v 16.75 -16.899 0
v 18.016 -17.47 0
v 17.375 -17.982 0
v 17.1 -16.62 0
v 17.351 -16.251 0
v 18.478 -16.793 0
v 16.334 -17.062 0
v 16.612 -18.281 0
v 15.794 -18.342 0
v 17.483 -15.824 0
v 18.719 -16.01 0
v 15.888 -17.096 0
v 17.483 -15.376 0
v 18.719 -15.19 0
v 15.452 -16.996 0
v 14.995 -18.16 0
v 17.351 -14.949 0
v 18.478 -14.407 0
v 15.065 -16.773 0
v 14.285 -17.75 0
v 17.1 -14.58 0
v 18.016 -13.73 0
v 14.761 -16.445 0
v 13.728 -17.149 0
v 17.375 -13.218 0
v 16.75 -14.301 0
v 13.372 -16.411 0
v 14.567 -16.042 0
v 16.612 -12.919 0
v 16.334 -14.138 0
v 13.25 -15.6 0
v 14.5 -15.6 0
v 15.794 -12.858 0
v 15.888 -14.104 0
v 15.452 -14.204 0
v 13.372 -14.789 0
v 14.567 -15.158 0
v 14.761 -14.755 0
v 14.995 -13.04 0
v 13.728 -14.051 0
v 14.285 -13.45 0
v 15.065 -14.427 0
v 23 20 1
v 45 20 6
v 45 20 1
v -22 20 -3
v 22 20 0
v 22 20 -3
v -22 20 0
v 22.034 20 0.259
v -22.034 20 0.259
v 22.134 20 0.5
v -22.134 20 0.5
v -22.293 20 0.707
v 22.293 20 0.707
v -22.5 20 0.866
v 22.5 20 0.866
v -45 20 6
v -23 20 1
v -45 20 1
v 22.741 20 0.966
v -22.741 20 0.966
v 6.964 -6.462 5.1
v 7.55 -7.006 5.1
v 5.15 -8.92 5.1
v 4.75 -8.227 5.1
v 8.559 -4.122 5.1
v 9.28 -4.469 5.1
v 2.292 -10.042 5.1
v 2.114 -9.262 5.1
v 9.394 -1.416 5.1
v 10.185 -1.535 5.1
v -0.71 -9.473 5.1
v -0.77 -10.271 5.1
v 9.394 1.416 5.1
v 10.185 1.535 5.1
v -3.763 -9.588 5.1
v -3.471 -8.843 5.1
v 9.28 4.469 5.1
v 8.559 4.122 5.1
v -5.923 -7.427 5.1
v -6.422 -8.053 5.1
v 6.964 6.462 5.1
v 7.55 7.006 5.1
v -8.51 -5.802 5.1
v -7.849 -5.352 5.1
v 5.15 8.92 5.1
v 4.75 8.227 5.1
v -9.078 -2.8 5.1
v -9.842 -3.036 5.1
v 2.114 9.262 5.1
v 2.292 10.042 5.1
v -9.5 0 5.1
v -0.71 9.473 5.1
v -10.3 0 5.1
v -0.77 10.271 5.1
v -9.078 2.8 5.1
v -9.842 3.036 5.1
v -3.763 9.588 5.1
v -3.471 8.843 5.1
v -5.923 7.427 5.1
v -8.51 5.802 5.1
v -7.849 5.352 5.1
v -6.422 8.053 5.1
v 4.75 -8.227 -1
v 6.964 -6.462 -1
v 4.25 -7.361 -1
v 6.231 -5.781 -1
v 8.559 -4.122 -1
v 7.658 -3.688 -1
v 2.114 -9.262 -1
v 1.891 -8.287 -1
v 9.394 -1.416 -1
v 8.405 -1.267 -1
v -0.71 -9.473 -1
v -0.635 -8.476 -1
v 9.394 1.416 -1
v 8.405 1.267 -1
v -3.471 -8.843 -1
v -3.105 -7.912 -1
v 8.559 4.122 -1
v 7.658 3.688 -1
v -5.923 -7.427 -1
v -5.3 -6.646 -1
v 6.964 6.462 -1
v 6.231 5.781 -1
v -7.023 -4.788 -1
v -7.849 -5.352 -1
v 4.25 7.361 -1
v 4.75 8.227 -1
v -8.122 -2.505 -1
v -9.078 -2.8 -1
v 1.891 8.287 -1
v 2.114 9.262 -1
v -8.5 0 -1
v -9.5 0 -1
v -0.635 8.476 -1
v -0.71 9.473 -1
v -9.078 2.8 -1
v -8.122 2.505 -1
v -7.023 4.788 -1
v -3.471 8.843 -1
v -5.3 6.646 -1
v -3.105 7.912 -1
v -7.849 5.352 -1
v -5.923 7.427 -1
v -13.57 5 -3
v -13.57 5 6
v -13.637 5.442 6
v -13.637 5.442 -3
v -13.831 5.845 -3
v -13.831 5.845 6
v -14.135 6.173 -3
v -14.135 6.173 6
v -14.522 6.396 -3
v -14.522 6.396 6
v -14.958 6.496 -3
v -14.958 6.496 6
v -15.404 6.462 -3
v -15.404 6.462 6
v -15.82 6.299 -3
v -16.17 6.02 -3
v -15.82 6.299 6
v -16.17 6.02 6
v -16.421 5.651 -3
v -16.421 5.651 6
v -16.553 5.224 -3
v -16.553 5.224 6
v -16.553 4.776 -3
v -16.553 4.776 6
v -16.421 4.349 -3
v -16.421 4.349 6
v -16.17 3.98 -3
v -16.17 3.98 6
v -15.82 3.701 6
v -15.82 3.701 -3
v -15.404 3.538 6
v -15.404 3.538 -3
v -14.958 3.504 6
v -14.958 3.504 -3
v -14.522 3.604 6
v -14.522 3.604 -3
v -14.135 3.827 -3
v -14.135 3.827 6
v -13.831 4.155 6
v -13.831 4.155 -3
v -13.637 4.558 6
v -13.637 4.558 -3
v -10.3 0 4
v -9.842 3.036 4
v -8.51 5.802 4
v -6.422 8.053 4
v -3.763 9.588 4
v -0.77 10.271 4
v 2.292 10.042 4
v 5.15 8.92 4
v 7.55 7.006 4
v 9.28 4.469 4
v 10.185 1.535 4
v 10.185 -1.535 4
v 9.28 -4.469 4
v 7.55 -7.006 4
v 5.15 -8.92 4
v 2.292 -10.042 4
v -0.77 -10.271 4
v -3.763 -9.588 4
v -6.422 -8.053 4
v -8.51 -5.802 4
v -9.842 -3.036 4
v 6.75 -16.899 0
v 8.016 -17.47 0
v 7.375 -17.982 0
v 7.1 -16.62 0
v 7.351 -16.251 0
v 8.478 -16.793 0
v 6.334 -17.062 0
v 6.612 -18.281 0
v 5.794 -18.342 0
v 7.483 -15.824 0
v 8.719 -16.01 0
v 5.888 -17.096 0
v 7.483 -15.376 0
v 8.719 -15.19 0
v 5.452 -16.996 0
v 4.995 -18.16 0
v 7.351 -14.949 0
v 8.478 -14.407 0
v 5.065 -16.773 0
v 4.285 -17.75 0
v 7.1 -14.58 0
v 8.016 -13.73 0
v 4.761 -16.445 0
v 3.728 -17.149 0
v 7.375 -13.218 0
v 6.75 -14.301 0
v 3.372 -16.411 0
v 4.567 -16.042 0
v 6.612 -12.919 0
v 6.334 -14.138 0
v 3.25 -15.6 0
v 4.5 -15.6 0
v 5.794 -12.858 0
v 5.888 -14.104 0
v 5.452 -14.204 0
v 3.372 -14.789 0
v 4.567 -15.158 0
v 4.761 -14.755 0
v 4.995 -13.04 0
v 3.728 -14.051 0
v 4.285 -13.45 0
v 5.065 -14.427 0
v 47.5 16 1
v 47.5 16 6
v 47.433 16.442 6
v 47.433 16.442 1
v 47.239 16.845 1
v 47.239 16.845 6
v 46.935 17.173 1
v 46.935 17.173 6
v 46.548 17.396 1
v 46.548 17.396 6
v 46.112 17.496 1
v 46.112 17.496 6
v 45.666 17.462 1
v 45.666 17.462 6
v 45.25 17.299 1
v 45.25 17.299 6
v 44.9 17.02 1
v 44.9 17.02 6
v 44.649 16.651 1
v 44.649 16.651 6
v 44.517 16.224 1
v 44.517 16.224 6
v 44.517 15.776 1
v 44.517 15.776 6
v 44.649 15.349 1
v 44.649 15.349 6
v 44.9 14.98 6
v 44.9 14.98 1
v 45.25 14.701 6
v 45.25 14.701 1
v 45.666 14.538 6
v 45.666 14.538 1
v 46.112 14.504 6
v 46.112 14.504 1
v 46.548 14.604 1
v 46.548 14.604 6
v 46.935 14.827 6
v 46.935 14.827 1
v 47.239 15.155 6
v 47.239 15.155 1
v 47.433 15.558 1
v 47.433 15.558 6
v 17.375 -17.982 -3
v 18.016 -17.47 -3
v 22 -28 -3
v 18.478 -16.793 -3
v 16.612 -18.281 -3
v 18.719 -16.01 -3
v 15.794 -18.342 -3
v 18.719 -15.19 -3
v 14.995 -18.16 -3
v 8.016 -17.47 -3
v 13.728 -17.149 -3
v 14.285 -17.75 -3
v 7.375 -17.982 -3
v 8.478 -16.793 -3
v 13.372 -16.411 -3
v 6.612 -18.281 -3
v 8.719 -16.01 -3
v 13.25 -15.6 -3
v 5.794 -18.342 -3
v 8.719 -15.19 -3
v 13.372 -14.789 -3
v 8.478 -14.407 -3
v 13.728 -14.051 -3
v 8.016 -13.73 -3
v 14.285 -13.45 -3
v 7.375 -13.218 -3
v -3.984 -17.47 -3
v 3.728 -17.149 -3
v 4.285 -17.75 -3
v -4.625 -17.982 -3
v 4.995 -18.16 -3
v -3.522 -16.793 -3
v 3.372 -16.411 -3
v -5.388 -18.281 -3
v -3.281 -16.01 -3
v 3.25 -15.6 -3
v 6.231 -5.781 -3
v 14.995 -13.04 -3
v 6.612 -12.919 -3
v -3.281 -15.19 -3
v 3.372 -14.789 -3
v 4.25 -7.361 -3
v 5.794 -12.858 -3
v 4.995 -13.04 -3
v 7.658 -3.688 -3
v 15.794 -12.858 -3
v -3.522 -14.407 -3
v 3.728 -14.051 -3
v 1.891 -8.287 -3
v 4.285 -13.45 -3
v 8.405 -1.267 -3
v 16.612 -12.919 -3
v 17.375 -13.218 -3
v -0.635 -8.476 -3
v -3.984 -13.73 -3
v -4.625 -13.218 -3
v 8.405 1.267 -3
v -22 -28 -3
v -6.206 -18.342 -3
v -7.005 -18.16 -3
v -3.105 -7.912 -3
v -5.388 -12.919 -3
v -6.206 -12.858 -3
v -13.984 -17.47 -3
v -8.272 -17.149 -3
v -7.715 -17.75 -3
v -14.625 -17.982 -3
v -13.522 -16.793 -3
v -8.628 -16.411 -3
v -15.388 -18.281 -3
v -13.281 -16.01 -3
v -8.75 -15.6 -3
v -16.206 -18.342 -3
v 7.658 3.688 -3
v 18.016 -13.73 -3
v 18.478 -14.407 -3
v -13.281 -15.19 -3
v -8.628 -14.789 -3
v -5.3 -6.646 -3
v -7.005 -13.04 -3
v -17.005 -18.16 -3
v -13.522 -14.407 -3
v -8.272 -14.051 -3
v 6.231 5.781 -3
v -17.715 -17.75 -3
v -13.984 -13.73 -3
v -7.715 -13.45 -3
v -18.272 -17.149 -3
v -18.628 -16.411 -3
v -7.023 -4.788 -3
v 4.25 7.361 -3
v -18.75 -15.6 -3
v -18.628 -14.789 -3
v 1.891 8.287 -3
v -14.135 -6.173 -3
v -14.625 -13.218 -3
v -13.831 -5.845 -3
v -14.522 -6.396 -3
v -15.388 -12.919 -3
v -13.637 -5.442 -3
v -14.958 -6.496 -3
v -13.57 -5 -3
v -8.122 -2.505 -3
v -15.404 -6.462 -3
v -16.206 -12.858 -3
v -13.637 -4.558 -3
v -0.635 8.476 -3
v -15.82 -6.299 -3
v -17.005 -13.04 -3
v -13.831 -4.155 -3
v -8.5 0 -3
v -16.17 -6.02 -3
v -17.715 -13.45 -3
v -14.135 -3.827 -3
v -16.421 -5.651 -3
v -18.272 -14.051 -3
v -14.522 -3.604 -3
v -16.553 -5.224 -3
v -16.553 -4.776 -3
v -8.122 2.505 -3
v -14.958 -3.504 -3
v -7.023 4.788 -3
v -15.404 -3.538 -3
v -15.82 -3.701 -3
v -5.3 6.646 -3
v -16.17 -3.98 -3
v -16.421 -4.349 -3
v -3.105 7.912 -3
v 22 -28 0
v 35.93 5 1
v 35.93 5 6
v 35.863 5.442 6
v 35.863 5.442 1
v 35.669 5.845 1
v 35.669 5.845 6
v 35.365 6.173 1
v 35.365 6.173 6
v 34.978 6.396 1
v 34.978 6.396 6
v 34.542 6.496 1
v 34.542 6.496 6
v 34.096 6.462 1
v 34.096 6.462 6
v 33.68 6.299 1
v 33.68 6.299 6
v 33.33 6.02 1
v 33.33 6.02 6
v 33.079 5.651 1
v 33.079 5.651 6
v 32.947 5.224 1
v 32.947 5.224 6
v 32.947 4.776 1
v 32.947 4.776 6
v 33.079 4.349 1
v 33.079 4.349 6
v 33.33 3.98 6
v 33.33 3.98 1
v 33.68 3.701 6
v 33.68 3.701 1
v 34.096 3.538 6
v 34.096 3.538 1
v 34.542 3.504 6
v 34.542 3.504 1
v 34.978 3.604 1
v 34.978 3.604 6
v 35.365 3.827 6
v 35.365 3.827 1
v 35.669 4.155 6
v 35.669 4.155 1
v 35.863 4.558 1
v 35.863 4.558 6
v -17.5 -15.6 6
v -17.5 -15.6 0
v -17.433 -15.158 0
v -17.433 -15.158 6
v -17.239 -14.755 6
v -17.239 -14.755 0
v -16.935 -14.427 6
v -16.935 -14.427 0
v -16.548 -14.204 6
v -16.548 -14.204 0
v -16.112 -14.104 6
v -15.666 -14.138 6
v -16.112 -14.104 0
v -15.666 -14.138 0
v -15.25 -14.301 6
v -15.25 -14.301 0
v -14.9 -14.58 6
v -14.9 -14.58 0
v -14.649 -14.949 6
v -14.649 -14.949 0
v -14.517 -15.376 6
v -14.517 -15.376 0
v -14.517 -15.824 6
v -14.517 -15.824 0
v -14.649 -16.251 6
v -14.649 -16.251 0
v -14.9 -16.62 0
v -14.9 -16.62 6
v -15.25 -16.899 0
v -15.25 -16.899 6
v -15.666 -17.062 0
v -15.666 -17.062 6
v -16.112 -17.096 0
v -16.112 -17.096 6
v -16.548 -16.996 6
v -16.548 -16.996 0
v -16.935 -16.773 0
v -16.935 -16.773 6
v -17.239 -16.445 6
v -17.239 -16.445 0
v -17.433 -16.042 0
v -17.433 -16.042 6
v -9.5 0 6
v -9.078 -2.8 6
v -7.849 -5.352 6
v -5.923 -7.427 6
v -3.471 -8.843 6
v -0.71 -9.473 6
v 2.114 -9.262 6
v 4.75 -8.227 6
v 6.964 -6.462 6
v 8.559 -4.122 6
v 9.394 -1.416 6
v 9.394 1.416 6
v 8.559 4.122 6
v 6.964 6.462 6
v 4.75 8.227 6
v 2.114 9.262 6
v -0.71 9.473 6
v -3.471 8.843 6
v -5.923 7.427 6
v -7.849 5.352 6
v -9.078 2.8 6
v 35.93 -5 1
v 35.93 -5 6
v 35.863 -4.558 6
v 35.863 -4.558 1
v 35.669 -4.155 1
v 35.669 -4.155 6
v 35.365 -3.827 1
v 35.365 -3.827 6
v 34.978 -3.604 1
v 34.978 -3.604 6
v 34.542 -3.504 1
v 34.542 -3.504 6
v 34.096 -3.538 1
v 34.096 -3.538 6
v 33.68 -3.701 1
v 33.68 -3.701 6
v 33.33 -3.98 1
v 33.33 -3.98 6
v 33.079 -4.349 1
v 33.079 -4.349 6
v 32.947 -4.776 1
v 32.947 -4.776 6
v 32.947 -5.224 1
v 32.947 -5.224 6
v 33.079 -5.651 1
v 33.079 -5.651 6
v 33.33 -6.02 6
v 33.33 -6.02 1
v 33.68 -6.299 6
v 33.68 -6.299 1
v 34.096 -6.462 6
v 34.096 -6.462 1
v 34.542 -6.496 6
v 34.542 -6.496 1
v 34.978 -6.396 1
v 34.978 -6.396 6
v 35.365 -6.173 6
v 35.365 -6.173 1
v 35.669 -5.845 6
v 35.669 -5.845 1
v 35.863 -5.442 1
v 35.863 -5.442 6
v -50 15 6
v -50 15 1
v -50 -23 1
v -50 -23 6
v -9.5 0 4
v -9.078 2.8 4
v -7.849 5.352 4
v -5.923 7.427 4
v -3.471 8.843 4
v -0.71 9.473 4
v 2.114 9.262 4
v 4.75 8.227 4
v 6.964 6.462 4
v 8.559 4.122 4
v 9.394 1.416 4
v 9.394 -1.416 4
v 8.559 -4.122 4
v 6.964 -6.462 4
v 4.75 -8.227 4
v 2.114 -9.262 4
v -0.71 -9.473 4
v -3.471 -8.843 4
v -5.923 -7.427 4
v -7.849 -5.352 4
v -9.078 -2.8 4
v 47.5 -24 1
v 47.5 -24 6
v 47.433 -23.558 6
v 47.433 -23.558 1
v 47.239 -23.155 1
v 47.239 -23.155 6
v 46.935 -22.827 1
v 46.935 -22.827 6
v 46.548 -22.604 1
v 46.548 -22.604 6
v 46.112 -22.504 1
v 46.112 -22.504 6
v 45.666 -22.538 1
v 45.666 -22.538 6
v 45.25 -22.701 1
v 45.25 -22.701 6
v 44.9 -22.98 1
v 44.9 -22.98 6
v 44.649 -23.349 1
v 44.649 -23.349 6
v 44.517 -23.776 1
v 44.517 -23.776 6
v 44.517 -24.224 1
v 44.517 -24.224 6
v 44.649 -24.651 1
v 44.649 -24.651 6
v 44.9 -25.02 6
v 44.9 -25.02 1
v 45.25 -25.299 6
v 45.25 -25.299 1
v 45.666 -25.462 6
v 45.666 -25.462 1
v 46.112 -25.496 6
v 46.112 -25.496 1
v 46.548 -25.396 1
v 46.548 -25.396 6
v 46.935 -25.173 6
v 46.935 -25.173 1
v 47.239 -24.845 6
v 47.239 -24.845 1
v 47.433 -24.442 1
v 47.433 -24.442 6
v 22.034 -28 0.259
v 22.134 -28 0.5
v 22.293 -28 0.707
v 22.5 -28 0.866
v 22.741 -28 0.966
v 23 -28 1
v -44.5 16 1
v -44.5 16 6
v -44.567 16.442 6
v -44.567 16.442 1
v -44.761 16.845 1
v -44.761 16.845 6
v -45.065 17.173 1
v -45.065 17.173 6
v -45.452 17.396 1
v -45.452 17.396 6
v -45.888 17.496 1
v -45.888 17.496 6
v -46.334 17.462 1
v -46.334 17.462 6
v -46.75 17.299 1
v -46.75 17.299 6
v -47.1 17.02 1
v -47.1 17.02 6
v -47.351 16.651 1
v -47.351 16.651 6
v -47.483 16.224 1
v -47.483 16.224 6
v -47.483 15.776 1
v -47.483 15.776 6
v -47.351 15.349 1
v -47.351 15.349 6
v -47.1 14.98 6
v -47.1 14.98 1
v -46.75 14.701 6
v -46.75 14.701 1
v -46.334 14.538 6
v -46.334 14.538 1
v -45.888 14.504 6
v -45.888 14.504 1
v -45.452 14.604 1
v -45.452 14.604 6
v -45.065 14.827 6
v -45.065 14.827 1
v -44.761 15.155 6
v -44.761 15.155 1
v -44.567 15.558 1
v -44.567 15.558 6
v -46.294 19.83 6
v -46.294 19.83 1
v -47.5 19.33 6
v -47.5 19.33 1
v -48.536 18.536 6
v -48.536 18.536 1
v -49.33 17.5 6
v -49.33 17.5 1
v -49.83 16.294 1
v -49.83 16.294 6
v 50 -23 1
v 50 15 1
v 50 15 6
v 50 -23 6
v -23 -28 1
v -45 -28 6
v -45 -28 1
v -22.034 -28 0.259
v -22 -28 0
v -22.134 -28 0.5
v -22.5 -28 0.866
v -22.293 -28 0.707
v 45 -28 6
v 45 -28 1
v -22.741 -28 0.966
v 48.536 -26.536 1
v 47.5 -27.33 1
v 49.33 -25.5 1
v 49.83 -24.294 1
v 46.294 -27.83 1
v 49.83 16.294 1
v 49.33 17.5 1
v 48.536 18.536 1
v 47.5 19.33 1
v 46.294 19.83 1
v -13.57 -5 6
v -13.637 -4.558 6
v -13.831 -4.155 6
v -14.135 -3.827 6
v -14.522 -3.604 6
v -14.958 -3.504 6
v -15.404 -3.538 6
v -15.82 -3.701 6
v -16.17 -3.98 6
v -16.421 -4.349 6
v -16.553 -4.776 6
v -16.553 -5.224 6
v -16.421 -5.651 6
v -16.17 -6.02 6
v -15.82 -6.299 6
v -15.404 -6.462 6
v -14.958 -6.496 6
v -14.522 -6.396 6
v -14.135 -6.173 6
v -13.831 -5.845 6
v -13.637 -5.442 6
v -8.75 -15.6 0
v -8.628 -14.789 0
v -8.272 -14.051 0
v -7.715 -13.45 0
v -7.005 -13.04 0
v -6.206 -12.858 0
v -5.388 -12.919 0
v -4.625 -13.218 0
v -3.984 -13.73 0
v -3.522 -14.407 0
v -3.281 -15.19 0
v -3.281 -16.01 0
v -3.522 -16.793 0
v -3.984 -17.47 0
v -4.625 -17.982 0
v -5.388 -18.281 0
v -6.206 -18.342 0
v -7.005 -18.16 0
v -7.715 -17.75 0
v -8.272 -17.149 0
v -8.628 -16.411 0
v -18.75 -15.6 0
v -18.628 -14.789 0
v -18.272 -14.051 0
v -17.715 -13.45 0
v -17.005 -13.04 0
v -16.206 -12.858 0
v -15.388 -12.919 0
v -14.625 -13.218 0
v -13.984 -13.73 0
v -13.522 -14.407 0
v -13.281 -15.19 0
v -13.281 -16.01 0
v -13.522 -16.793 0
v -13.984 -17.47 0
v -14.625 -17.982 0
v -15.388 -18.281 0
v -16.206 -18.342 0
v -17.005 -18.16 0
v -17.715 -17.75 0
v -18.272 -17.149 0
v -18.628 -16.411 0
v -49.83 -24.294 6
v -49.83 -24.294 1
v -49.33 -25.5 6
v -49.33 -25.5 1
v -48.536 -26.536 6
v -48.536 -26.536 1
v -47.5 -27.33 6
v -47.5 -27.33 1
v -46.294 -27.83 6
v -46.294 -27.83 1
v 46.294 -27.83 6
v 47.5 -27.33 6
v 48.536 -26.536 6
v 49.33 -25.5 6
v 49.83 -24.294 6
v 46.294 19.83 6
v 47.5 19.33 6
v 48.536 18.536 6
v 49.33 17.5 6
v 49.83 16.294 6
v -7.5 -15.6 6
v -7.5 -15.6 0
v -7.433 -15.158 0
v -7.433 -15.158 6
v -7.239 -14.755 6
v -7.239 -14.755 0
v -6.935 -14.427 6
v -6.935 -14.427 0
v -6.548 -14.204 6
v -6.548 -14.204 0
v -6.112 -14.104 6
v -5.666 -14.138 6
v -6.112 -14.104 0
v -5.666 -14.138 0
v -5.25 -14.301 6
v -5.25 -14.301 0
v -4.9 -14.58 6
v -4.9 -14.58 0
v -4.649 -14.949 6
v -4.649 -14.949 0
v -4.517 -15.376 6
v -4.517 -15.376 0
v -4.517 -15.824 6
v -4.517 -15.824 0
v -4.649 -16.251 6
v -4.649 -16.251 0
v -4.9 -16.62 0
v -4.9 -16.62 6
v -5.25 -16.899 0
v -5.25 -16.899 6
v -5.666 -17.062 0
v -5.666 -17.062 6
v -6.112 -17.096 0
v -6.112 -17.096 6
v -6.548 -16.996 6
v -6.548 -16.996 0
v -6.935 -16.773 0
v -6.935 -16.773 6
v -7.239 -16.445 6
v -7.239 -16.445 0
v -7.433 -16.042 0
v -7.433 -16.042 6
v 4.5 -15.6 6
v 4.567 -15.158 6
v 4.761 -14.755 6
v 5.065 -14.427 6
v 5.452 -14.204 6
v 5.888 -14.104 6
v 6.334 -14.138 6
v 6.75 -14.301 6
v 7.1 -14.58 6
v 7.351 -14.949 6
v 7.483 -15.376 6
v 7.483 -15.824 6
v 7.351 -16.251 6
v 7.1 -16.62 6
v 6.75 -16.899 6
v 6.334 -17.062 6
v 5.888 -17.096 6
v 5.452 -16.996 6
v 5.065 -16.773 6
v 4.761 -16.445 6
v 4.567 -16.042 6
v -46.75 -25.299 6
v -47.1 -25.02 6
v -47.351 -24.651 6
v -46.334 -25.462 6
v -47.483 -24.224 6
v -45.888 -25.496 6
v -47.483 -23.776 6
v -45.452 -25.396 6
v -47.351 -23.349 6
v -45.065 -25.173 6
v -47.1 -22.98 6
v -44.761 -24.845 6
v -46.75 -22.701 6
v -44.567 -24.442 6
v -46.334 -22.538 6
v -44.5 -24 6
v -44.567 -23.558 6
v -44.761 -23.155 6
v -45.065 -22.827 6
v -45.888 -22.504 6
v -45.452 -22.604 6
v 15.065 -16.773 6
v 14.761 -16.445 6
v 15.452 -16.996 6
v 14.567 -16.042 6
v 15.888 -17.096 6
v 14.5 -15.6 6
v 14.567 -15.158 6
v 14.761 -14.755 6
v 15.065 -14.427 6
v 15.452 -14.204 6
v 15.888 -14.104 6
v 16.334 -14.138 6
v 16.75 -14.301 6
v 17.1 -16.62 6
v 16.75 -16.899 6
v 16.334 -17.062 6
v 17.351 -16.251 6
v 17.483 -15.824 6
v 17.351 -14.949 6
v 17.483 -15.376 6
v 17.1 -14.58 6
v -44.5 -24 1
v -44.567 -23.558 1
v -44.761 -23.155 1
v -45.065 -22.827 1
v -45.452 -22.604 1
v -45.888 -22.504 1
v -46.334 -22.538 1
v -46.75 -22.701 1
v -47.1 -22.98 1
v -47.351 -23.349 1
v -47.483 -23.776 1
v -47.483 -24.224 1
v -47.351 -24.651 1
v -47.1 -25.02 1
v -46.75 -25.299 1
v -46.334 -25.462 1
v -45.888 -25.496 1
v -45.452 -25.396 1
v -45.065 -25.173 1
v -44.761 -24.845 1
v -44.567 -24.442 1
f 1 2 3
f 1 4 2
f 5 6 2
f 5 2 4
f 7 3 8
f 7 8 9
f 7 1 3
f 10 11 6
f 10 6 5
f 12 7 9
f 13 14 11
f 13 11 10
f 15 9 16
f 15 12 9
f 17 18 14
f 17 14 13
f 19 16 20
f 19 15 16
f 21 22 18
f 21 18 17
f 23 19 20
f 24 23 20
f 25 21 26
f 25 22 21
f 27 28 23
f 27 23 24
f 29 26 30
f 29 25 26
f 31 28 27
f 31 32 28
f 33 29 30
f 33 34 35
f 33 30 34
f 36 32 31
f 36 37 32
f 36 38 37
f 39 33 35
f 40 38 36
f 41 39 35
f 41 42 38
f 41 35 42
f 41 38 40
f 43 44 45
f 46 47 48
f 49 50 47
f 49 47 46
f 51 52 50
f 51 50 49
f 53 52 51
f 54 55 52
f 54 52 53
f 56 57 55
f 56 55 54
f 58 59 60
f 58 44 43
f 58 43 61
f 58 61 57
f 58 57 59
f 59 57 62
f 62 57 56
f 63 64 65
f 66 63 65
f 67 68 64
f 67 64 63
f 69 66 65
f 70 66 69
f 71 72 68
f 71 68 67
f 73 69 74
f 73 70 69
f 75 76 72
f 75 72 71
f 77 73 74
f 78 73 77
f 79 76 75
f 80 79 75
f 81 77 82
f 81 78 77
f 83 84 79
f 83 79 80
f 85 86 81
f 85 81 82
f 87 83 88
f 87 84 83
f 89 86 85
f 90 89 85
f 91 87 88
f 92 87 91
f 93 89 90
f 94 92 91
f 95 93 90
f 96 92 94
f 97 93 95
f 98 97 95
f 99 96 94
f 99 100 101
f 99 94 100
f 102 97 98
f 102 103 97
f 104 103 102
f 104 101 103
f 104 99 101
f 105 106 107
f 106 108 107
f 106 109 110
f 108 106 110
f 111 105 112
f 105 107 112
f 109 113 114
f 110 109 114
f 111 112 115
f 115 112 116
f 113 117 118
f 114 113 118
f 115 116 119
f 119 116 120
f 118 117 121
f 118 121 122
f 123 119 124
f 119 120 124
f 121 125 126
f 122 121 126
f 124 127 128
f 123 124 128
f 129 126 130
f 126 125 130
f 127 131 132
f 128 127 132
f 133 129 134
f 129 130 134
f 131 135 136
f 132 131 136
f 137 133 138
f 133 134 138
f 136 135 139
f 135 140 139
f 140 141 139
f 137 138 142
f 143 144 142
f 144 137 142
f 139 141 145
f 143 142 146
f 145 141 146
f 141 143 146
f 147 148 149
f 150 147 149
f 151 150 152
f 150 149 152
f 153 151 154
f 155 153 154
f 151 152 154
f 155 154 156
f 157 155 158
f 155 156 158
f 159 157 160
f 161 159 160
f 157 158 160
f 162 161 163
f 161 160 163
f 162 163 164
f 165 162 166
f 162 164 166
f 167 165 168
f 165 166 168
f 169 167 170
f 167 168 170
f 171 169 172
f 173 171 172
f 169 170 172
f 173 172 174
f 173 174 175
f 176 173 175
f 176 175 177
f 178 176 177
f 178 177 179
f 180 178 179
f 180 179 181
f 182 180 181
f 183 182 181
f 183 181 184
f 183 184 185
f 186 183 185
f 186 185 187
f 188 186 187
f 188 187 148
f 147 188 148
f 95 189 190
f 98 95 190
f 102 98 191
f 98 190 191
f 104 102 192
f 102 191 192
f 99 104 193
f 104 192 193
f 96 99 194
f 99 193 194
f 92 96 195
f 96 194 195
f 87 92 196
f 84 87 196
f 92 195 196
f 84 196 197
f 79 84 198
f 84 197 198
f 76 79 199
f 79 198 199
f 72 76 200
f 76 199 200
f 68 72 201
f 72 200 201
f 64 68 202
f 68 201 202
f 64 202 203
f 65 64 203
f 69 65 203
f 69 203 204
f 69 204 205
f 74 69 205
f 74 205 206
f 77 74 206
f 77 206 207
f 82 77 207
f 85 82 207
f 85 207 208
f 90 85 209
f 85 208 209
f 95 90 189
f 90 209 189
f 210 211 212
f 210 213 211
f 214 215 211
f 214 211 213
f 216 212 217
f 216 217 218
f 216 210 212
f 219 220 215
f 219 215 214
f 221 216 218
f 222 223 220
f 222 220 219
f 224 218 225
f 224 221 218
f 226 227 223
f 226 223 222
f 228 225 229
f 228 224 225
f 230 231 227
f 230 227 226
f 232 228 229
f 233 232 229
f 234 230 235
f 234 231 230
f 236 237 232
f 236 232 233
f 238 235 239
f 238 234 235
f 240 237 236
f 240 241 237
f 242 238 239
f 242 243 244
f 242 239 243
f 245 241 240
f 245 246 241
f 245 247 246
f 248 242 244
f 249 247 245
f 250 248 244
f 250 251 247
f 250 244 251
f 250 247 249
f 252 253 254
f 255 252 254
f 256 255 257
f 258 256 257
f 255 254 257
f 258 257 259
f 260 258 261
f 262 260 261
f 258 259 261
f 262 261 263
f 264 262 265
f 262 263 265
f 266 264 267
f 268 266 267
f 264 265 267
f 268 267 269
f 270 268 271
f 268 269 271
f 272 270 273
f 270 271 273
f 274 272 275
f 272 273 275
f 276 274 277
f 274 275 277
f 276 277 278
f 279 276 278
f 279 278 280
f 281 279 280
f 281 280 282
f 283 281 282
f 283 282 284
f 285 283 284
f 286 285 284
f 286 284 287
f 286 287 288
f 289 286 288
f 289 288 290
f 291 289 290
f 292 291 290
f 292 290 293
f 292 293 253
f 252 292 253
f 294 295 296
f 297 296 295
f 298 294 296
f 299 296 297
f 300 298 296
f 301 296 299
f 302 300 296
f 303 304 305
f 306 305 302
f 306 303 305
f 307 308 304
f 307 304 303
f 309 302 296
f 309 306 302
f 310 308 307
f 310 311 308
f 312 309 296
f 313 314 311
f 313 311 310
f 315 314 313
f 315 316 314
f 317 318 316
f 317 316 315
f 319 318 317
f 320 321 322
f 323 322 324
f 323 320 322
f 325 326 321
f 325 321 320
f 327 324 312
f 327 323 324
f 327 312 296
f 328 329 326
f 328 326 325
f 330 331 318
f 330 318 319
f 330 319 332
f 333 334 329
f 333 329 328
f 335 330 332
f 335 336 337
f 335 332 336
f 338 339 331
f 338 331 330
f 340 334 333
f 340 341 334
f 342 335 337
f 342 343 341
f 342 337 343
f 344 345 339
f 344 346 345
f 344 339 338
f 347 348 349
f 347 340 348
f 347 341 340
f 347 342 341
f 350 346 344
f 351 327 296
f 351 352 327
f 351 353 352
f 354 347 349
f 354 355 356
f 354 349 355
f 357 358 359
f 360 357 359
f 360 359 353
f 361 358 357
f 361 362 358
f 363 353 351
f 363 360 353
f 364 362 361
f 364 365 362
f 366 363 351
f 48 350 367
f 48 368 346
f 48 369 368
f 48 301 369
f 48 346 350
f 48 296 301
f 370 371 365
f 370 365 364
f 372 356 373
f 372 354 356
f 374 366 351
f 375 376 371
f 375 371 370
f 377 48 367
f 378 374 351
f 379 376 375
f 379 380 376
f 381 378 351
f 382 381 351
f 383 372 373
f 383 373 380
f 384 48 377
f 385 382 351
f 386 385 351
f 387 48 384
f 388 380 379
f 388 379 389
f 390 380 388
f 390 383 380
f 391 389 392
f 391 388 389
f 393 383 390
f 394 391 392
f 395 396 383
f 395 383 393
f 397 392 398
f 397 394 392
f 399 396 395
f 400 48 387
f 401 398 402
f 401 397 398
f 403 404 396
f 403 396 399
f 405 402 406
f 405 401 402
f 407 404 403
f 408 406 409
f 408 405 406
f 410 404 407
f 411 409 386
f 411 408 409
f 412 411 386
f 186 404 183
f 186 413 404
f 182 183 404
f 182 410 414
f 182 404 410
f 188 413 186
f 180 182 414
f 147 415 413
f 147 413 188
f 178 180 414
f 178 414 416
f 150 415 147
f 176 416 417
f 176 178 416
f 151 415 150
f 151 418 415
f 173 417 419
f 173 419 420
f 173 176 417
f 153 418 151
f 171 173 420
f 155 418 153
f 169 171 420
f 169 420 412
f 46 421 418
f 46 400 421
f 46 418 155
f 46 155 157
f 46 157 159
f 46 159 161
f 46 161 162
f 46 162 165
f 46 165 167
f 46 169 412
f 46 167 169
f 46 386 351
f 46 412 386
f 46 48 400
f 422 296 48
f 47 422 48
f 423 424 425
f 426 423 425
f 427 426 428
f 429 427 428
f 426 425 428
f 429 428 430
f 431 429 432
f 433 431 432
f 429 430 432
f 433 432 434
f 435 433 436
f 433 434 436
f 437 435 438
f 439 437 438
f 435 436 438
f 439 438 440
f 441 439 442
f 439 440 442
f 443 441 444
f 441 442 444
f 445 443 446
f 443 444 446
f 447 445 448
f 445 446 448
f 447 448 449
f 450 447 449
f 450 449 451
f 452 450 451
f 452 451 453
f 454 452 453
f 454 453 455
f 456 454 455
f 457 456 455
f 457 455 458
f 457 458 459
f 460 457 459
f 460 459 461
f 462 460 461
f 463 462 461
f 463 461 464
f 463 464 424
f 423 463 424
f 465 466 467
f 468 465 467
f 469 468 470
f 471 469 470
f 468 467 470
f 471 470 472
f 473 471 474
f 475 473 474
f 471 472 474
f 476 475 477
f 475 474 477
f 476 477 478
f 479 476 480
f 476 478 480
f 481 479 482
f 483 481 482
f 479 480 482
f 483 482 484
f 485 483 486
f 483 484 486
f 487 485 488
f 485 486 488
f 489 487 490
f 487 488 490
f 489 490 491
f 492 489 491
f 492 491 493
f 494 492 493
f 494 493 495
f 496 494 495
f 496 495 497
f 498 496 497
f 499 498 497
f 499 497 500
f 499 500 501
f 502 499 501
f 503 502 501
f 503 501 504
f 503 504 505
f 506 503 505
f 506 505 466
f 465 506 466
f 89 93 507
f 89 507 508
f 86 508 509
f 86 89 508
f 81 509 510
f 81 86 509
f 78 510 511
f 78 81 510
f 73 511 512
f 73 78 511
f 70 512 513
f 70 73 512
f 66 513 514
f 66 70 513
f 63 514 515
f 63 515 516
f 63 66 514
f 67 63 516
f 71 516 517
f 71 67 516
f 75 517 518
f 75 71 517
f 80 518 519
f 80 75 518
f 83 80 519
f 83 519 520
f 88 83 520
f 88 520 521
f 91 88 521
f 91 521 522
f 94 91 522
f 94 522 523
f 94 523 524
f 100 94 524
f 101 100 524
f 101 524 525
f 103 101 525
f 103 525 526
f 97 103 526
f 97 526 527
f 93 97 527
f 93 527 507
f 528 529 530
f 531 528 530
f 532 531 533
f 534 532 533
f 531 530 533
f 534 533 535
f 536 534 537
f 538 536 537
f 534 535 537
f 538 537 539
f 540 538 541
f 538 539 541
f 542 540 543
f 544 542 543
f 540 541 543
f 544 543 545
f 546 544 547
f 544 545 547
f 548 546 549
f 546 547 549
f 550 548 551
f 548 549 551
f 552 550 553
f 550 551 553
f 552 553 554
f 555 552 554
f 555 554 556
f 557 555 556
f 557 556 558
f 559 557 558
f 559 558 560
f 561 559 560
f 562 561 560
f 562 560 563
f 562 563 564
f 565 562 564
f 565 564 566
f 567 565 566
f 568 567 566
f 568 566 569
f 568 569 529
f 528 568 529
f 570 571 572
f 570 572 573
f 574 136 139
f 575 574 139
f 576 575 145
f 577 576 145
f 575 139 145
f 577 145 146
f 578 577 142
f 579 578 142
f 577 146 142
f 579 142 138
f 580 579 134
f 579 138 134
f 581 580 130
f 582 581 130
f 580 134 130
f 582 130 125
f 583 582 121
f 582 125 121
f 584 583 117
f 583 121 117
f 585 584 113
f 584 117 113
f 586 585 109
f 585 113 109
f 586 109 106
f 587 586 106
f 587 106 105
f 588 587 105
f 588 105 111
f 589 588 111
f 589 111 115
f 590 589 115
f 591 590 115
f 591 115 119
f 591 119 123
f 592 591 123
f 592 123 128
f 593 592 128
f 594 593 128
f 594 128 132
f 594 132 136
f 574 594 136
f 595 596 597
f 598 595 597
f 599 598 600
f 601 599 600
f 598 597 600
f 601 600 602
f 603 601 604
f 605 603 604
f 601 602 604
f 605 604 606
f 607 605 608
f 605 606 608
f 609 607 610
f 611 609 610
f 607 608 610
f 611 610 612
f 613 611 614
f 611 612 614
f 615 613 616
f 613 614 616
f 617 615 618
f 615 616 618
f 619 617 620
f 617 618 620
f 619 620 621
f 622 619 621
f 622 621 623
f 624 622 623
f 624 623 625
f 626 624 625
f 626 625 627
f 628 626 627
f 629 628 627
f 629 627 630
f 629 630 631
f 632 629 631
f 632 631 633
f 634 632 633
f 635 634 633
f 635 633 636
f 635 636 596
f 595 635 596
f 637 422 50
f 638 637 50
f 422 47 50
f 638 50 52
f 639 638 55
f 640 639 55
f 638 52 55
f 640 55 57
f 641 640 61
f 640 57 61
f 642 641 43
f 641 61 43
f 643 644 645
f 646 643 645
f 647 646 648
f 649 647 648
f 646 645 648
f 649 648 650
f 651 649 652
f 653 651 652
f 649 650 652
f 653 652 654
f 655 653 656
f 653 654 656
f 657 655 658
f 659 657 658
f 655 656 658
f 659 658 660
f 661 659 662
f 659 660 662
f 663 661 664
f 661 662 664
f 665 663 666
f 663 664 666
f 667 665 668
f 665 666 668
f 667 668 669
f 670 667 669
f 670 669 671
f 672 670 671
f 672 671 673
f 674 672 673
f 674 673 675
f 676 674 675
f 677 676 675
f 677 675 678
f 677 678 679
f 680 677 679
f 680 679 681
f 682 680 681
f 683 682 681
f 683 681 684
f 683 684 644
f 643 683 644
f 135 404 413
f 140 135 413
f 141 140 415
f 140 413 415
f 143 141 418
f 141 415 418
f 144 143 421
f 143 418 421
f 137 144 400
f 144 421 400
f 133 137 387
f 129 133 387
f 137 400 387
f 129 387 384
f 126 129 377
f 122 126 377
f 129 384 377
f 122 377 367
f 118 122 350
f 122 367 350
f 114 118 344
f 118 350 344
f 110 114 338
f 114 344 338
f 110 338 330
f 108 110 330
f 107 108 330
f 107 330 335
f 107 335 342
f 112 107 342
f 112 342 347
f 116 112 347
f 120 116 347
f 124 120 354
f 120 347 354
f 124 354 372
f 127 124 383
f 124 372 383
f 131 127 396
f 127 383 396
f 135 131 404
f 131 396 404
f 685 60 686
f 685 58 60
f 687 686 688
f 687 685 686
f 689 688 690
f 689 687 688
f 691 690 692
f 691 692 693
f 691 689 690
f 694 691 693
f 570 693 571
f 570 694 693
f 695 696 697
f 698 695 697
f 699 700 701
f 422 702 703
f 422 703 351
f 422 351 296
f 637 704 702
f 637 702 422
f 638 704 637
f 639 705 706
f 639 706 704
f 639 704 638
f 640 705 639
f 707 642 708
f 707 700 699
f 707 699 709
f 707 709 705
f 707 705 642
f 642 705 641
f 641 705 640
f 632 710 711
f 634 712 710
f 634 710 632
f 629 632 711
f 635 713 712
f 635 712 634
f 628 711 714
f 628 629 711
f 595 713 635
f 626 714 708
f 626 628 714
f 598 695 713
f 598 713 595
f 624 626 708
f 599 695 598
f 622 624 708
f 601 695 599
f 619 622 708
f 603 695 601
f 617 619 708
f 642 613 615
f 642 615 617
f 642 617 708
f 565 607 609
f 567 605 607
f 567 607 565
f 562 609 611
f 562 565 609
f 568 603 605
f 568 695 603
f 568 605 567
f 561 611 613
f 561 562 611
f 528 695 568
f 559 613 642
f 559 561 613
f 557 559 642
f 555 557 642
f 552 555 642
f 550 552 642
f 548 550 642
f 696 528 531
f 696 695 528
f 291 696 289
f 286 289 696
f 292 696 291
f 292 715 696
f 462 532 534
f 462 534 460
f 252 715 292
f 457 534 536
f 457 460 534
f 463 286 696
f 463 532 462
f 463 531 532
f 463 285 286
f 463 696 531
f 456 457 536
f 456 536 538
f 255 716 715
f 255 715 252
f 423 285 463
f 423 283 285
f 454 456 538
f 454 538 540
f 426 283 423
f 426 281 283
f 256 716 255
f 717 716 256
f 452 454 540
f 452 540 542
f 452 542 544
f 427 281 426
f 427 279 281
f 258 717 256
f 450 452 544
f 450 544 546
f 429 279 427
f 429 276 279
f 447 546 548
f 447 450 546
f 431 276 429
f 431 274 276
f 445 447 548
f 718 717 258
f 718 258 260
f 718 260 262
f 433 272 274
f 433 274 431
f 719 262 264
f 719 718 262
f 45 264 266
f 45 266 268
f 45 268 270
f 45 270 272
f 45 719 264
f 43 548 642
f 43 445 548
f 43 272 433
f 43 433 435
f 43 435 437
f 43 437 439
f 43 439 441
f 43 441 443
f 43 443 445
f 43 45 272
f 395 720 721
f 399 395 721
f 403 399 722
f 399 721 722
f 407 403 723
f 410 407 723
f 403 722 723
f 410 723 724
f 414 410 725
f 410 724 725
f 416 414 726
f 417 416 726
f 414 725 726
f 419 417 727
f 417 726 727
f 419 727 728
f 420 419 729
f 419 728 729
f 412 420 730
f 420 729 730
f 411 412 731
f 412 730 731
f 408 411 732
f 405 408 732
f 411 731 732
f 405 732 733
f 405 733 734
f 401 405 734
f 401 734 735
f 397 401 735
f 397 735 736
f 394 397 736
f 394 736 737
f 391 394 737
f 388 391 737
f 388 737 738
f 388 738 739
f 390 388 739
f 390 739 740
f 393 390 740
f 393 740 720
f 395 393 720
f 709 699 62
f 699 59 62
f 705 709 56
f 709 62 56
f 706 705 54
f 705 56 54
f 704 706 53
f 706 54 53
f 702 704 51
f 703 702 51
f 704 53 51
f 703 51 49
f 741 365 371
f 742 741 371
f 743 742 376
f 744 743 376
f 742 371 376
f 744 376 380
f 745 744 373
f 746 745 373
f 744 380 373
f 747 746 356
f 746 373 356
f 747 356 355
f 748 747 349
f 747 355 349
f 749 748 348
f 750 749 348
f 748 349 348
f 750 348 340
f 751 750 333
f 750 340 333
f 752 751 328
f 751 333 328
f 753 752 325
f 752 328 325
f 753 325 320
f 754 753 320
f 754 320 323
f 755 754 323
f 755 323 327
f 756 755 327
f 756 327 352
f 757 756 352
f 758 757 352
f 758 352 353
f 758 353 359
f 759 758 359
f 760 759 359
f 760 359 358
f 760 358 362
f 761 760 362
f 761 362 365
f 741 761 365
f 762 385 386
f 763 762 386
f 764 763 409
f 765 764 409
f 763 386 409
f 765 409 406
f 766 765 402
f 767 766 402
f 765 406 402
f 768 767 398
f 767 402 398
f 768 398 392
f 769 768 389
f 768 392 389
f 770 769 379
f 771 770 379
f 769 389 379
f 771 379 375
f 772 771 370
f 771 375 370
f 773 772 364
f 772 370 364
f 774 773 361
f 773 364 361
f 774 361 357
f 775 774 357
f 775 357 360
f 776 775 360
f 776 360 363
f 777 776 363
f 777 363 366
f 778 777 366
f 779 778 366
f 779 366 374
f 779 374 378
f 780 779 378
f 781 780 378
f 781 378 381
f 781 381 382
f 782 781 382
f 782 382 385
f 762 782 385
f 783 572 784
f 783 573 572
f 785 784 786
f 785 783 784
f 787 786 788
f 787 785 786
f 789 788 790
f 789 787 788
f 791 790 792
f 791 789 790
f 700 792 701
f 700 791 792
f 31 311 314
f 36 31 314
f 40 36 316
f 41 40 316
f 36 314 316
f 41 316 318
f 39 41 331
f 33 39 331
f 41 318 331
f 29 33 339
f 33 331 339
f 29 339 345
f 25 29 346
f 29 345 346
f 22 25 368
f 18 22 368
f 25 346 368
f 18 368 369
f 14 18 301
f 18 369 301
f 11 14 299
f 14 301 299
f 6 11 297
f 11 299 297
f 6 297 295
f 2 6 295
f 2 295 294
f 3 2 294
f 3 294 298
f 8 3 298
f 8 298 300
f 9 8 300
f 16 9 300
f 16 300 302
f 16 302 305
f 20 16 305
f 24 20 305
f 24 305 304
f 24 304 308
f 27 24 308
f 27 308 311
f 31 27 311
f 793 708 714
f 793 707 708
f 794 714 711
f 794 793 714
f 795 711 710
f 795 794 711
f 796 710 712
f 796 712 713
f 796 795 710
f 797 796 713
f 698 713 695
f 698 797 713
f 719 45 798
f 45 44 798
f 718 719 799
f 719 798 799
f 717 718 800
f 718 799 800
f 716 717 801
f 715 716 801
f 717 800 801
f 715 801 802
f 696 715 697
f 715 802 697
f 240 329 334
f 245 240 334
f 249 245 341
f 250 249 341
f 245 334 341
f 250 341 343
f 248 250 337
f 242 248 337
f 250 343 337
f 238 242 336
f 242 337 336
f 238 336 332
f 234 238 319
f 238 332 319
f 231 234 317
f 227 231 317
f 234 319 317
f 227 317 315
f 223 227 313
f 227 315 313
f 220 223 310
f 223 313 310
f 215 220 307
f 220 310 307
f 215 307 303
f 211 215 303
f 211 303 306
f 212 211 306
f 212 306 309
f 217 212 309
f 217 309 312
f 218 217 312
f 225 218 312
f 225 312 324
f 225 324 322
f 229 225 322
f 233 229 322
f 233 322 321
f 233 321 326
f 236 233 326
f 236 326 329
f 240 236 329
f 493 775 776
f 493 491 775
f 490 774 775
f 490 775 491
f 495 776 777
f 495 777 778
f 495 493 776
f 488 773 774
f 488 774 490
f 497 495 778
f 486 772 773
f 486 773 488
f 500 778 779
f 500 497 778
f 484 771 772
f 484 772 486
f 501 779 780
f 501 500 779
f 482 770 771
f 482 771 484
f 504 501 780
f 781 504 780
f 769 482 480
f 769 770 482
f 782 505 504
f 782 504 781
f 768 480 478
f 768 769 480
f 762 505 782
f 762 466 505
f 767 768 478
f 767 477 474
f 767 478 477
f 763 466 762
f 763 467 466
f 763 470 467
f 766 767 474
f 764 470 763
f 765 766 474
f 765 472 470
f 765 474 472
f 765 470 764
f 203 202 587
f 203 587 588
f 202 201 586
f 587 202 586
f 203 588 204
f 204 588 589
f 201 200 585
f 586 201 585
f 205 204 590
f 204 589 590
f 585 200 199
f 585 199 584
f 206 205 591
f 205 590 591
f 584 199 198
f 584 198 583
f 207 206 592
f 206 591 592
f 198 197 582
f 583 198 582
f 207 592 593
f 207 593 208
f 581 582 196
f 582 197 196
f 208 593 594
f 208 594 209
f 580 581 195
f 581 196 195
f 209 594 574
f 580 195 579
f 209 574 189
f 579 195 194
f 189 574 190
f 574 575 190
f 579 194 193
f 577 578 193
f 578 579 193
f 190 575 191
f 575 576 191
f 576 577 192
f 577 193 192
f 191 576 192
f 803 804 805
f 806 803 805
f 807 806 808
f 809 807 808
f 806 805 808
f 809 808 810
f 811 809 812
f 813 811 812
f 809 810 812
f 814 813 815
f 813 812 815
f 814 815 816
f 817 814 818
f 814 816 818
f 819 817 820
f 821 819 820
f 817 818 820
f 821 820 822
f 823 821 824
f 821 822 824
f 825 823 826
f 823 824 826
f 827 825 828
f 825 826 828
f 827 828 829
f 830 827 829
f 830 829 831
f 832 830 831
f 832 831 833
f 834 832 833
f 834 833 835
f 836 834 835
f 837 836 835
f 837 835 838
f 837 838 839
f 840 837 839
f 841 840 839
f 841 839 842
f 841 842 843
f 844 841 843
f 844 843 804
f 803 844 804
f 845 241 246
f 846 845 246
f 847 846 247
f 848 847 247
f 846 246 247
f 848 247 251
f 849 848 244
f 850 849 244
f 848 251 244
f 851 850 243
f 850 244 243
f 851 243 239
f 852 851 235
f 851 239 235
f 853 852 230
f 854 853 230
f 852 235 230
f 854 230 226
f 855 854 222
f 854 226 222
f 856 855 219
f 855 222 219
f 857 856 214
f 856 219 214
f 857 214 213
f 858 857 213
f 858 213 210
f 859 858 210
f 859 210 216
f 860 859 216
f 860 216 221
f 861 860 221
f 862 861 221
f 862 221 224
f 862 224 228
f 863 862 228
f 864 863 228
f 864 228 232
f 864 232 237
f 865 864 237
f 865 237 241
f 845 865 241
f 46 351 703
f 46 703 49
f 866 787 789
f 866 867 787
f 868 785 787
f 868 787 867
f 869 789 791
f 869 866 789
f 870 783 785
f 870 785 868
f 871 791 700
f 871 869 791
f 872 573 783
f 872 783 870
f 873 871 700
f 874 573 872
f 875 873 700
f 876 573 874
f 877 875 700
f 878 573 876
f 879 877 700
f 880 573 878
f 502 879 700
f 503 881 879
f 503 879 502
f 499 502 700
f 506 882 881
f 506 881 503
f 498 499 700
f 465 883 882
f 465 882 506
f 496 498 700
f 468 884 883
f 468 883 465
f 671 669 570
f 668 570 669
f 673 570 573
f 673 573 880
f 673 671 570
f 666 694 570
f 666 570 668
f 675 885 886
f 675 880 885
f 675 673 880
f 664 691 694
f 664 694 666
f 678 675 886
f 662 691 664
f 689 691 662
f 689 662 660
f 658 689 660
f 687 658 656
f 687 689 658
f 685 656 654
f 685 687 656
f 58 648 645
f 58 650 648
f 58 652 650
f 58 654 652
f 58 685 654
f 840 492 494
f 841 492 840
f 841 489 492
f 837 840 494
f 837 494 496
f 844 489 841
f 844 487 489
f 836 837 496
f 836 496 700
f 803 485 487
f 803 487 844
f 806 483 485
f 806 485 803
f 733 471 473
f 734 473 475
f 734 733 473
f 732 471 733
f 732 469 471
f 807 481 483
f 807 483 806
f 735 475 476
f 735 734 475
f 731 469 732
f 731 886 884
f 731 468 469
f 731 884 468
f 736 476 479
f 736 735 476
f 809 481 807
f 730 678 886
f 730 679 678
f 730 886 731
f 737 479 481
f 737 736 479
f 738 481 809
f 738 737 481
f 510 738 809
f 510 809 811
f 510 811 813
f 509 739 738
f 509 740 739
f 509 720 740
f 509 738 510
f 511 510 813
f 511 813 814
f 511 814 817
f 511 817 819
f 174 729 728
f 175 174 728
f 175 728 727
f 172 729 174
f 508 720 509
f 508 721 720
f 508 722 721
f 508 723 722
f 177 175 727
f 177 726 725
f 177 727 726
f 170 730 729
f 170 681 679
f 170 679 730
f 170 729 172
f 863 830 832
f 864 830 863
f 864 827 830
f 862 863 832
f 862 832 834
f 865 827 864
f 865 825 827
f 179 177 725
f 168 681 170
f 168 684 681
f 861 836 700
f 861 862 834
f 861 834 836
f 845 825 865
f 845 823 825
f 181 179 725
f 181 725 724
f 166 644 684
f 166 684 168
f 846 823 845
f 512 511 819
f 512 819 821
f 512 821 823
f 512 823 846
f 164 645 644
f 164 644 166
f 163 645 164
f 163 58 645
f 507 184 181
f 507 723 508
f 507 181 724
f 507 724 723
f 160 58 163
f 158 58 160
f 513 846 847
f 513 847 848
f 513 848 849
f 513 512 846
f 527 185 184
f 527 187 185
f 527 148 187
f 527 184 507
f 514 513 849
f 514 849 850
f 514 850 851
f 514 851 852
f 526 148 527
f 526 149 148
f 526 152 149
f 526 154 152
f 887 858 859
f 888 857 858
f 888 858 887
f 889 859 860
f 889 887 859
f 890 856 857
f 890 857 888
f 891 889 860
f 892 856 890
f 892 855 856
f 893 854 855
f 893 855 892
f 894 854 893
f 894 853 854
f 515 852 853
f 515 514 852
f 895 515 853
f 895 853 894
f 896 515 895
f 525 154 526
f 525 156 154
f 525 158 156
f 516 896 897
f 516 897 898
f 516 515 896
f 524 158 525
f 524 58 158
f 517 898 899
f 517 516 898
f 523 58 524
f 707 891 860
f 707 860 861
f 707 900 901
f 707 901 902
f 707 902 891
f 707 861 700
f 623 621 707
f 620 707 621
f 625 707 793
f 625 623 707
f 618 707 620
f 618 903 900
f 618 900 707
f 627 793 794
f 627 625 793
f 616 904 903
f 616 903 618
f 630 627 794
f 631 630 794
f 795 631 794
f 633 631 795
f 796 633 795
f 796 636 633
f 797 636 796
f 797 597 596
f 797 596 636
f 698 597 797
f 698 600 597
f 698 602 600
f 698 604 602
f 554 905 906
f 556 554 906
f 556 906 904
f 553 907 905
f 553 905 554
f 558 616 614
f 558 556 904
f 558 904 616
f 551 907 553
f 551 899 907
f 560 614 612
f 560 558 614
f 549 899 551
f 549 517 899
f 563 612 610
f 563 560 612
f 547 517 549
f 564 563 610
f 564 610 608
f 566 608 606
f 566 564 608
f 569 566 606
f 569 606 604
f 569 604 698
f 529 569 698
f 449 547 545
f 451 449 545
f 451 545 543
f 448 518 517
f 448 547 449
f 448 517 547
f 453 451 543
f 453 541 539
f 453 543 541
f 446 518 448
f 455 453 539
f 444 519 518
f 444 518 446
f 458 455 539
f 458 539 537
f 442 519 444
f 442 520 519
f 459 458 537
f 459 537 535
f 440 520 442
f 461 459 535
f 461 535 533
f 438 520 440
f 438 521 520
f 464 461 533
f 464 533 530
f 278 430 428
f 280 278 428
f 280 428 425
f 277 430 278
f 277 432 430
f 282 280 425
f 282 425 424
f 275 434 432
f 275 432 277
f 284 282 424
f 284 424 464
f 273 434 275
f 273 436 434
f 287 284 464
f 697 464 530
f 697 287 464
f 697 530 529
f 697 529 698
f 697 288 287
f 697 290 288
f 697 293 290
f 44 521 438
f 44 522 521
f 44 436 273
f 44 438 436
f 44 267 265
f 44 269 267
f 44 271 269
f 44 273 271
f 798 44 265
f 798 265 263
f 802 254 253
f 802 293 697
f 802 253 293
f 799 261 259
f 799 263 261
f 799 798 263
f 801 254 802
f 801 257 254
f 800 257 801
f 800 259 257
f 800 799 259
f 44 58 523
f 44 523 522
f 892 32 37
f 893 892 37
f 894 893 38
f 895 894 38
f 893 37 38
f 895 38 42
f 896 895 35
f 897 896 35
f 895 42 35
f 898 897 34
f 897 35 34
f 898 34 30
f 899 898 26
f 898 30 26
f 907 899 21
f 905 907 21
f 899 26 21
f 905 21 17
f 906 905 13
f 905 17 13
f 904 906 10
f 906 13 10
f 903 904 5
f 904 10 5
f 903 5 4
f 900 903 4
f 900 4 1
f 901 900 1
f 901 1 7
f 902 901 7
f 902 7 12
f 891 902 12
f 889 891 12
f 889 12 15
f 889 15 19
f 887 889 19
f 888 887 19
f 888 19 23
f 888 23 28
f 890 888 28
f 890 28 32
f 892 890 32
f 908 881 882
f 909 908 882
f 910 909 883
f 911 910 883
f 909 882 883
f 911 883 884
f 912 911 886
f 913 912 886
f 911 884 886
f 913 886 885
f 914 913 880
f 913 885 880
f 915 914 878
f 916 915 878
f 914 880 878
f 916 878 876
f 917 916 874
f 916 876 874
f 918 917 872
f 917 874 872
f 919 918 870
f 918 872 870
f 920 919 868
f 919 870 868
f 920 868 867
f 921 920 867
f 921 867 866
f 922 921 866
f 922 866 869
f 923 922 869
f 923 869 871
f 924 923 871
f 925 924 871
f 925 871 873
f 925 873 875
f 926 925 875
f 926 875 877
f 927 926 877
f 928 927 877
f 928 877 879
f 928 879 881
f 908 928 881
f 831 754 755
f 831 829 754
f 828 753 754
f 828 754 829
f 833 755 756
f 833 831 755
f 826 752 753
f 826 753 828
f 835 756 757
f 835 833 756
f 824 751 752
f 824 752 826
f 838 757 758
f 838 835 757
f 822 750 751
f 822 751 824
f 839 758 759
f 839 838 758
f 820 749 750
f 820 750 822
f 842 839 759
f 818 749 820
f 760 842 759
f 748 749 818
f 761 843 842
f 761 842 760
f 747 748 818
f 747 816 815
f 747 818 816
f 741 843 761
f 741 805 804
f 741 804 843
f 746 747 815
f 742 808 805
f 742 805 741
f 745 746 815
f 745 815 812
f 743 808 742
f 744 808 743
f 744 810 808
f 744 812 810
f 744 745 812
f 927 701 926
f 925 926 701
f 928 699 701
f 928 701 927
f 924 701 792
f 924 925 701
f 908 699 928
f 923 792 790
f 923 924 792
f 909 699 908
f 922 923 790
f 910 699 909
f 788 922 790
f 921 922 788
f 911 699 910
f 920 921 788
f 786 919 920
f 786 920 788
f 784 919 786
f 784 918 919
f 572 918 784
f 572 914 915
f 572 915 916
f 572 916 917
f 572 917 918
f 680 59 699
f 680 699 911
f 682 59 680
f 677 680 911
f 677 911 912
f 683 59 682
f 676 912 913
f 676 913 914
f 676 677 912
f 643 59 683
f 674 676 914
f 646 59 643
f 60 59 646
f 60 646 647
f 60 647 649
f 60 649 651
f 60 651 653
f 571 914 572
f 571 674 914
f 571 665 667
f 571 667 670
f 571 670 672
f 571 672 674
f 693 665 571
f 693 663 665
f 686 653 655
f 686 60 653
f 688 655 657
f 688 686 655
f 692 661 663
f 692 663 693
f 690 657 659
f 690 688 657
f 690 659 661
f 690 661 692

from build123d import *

# Parameters (mm, degrees)
SKETCH_1_W                = 100
SKETCH_1_H                = 40
EXTRUDE_1_DEPTH           = 6
SKETCH_2_W                = 100
SKETCH_2_H                = 40
EXTRUDE_2_DEPTH           = 3
SKETCH_4_R                = 9.5
CUT_EXTRUDE_1_DEPTH       = 7
SKETCH_5_R                = 10.3
CUT_EXTRUDE_2_DEPTH       = 1.1
CUT_EXTRUDE_START         = -5
SKETCH_6_R                = 9.5
CUT_EXTRUDE_3_DEPTH       = 5
SKETCH_7_R                = 1.5
CUT_EXTRUDE_4_DEPTH       = 12
SKETCH_8_W                = 100
SKETCH_8_H                = 9
EXTRUDE_3_DEPTH           = 8
SKETCH_9_R                = 1.5
CUT_EXTRUDE_5_DEPTH       = 10
SKETCH_13_R               = 1.5
CUT_EXTRUDE_6_DEPTH       = 10
HOLE_WIZARD_1_D           = 3
HOLE_WIZARD_1_CBORE_D     = 5.5
HOLE_WIZARD_1_CBORE_DEPTH = 3
SKETCH_15_W               = 28
SKETCH_15_H               = 56.444719302
SKETCH_15_H_2             = 58.874458875
CUT_EXTRUDE_7_DEPTH       = 4
FILLET_3_R                = 1
FILLET_4_R                = 5
SKETCH_16_R               = 9.5
SKETCH_16_R_2             = 8.5
EXTRUDE_4_DEPTH           = 2


with BuildPart() as part:
    # 草图1 → 凸台-拉伸1 (new body)
    with BuildSketch(Plane.XY):
        Rectangle(SKETCH_1_W, SKETCH_1_H)
    extrude(amount=EXTRUDE_1_DEPTH)

    # 草图2 → 凸台-拉伸2 (add)
    with BuildSketch(Plane(origin=(0, 0, 0), x_dir=(-1, 0, 0), z_dir=(0, 0, -1))):
        Rectangle(SKETCH_2_W, SKETCH_2_H)
    extrude(amount=EXTRUDE_2_DEPTH)

    # 草图4 → 切除-拉伸1 (cut)
    with BuildSketch(Plane(origin=(0, 0, -3), x_dir=(-1, 0, 0), z_dir=(0, 0, -1))):
        Circle(SKETCH_4_R)
    extrude(amount=-CUT_EXTRUDE_1_DEPTH, mode=Mode.SUBTRACT)

    # 草图5 → 切除-拉伸2 (cut)
    with BuildSketch(Plane(origin=(0, 0, 4), x_dir=(-1, 0, 0), z_dir=(0, 0, -1))):
        Circle(SKETCH_5_R)
    extrude(amount=-CUT_EXTRUDE_2_DEPTH, mode=Mode.SUBTRACT)

    # 草图6 → 切除-拉伸3 (cut)
    with BuildSketch(Plane.XY.offset(6).offset(CUT_EXTRUDE_START)):
        with Locations(Location((0, 0, 0), (0, 0, 180))):
            Circle(SKETCH_6_R)
    extrude(amount=CUT_EXTRUDE_3_DEPTH, mode=Mode.SUBTRACT)

    # 草图7 → 切除-拉伸4 (cut)
    with BuildSketch(Plane.XY.offset(6)):
        with Locations((-15.07, 5)):
            Circle(SKETCH_7_R)
        with Locations((34.43, 5)):
            Circle(SKETCH_7_R)
        with Locations((-15.07, -5)):
            Circle(SKETCH_7_R)
        with Locations((34.43, -5)):
            Circle(SKETCH_7_R)
    extrude(amount=-CUT_EXTRUDE_4_DEPTH, mode=Mode.SUBTRACT)

    # 草图8 → 凸台-拉伸3 (add)
    with BuildSketch(Plane.XZ.offset(20)):
        with Locations((0, 1.5)):
            Rectangle(SKETCH_8_W, SKETCH_8_H)
    extrude(amount=EXTRUDE_3_DEPTH)

    # 草图9 → 切除-拉伸5 (cut)
    with BuildSketch(Plane(origin=(0, 0, -3), x_dir=(-1, 0, 0), z_dir=(0, 0, -1))):
        with Locations((-6, -15.6)):
            Circle(SKETCH_9_R)
        with Locations((6, -15.6)):
            Circle(SKETCH_9_R)
        with Locations((-16, -15.6)):
            Circle(SKETCH_9_R)
        with Locations((16, -15.6)):
            Circle(SKETCH_9_R)
    extrude(amount=-CUT_EXTRUDE_5_DEPTH, mode=Mode.SUBTRACT)

    # 草图13 → 切除-拉伸6 (cut)
    with BuildSketch(Plane.XY.offset(6)):
        with Locations((-46, 16)):
            Circle(SKETCH_13_R)
        with Locations((46, 16)):
            Circle(SKETCH_13_R)
        with Locations((-46, -24)):
            Circle(SKETCH_13_R)
        with Locations((46, -24)):
            Circle(SKETCH_13_R)
    extrude(amount=-CUT_EXTRUDE_6_DEPTH, mode=Mode.SUBTRACT)

    # 孔1 (through all)
    with Locations(Plane(origin=(-16, -15.6, -3), x_dir=(-1, 0, 0), z_dir=(0, 0, -1))):
        with Locations((0, 0), (-10, 0), (-22, 0), (-32, 0)):
            CounterBoreHole(HOLE_WIZARD_1_D / 2, HOLE_WIZARD_1_CBORE_D / 2, HOLE_WIZARD_1_CBORE_DEPTH)

    # 草图15 → 切除-拉伸7 (cut)
    with BuildSketch(Plane(origin=(0, 0, -3), x_dir=(-1, 0, 0), z_dir=(0, 0, -1))):
        with Locations((-36, -3.626193912)):
            Rectangle(SKETCH_15_W, SKETCH_15_H)
        with Locations((36, -5.588675874)):
            Rectangle(SKETCH_15_W, SKETCH_15_H_2)
    extrude(amount=-CUT_EXTRUDE_7_DEPTH, mode=Mode.SUBTRACT)

    # 圆角3
    fillet_3_edges = [part.edges().sort_by_distance(p)[0] for p in [
        (22, -4, 1),
        (-22, -4, 1),
    ]]
    fillet(fillet_3_edges, radius=FILLET_3_R)

    # 圆角4
    fillet_4_edges = [part.edges().sort_by_distance(p)[0] for p in [
        (50, -28, 3.5),
        (-50, -28, 3.5),
        (-50, 20, 3.5),
        (50, 20, 3.5),
    ]]
    fillet(fillet_4_edges, radius=FILLET_4_R)

    # 草图16 → 凸台-拉伸4 (add)
    with BuildSketch(Plane(origin=(0, 0, -3), x_dir=(-1, 0, 0), z_dir=(0, 0, -1))):
        Circle(SKETCH_16_R)
        Circle(SKETCH_16_R_2, mode=Mode.SUBTRACT)
    extrude(amount=-EXTRUDE_4_DEPTH)


solid = part.part
